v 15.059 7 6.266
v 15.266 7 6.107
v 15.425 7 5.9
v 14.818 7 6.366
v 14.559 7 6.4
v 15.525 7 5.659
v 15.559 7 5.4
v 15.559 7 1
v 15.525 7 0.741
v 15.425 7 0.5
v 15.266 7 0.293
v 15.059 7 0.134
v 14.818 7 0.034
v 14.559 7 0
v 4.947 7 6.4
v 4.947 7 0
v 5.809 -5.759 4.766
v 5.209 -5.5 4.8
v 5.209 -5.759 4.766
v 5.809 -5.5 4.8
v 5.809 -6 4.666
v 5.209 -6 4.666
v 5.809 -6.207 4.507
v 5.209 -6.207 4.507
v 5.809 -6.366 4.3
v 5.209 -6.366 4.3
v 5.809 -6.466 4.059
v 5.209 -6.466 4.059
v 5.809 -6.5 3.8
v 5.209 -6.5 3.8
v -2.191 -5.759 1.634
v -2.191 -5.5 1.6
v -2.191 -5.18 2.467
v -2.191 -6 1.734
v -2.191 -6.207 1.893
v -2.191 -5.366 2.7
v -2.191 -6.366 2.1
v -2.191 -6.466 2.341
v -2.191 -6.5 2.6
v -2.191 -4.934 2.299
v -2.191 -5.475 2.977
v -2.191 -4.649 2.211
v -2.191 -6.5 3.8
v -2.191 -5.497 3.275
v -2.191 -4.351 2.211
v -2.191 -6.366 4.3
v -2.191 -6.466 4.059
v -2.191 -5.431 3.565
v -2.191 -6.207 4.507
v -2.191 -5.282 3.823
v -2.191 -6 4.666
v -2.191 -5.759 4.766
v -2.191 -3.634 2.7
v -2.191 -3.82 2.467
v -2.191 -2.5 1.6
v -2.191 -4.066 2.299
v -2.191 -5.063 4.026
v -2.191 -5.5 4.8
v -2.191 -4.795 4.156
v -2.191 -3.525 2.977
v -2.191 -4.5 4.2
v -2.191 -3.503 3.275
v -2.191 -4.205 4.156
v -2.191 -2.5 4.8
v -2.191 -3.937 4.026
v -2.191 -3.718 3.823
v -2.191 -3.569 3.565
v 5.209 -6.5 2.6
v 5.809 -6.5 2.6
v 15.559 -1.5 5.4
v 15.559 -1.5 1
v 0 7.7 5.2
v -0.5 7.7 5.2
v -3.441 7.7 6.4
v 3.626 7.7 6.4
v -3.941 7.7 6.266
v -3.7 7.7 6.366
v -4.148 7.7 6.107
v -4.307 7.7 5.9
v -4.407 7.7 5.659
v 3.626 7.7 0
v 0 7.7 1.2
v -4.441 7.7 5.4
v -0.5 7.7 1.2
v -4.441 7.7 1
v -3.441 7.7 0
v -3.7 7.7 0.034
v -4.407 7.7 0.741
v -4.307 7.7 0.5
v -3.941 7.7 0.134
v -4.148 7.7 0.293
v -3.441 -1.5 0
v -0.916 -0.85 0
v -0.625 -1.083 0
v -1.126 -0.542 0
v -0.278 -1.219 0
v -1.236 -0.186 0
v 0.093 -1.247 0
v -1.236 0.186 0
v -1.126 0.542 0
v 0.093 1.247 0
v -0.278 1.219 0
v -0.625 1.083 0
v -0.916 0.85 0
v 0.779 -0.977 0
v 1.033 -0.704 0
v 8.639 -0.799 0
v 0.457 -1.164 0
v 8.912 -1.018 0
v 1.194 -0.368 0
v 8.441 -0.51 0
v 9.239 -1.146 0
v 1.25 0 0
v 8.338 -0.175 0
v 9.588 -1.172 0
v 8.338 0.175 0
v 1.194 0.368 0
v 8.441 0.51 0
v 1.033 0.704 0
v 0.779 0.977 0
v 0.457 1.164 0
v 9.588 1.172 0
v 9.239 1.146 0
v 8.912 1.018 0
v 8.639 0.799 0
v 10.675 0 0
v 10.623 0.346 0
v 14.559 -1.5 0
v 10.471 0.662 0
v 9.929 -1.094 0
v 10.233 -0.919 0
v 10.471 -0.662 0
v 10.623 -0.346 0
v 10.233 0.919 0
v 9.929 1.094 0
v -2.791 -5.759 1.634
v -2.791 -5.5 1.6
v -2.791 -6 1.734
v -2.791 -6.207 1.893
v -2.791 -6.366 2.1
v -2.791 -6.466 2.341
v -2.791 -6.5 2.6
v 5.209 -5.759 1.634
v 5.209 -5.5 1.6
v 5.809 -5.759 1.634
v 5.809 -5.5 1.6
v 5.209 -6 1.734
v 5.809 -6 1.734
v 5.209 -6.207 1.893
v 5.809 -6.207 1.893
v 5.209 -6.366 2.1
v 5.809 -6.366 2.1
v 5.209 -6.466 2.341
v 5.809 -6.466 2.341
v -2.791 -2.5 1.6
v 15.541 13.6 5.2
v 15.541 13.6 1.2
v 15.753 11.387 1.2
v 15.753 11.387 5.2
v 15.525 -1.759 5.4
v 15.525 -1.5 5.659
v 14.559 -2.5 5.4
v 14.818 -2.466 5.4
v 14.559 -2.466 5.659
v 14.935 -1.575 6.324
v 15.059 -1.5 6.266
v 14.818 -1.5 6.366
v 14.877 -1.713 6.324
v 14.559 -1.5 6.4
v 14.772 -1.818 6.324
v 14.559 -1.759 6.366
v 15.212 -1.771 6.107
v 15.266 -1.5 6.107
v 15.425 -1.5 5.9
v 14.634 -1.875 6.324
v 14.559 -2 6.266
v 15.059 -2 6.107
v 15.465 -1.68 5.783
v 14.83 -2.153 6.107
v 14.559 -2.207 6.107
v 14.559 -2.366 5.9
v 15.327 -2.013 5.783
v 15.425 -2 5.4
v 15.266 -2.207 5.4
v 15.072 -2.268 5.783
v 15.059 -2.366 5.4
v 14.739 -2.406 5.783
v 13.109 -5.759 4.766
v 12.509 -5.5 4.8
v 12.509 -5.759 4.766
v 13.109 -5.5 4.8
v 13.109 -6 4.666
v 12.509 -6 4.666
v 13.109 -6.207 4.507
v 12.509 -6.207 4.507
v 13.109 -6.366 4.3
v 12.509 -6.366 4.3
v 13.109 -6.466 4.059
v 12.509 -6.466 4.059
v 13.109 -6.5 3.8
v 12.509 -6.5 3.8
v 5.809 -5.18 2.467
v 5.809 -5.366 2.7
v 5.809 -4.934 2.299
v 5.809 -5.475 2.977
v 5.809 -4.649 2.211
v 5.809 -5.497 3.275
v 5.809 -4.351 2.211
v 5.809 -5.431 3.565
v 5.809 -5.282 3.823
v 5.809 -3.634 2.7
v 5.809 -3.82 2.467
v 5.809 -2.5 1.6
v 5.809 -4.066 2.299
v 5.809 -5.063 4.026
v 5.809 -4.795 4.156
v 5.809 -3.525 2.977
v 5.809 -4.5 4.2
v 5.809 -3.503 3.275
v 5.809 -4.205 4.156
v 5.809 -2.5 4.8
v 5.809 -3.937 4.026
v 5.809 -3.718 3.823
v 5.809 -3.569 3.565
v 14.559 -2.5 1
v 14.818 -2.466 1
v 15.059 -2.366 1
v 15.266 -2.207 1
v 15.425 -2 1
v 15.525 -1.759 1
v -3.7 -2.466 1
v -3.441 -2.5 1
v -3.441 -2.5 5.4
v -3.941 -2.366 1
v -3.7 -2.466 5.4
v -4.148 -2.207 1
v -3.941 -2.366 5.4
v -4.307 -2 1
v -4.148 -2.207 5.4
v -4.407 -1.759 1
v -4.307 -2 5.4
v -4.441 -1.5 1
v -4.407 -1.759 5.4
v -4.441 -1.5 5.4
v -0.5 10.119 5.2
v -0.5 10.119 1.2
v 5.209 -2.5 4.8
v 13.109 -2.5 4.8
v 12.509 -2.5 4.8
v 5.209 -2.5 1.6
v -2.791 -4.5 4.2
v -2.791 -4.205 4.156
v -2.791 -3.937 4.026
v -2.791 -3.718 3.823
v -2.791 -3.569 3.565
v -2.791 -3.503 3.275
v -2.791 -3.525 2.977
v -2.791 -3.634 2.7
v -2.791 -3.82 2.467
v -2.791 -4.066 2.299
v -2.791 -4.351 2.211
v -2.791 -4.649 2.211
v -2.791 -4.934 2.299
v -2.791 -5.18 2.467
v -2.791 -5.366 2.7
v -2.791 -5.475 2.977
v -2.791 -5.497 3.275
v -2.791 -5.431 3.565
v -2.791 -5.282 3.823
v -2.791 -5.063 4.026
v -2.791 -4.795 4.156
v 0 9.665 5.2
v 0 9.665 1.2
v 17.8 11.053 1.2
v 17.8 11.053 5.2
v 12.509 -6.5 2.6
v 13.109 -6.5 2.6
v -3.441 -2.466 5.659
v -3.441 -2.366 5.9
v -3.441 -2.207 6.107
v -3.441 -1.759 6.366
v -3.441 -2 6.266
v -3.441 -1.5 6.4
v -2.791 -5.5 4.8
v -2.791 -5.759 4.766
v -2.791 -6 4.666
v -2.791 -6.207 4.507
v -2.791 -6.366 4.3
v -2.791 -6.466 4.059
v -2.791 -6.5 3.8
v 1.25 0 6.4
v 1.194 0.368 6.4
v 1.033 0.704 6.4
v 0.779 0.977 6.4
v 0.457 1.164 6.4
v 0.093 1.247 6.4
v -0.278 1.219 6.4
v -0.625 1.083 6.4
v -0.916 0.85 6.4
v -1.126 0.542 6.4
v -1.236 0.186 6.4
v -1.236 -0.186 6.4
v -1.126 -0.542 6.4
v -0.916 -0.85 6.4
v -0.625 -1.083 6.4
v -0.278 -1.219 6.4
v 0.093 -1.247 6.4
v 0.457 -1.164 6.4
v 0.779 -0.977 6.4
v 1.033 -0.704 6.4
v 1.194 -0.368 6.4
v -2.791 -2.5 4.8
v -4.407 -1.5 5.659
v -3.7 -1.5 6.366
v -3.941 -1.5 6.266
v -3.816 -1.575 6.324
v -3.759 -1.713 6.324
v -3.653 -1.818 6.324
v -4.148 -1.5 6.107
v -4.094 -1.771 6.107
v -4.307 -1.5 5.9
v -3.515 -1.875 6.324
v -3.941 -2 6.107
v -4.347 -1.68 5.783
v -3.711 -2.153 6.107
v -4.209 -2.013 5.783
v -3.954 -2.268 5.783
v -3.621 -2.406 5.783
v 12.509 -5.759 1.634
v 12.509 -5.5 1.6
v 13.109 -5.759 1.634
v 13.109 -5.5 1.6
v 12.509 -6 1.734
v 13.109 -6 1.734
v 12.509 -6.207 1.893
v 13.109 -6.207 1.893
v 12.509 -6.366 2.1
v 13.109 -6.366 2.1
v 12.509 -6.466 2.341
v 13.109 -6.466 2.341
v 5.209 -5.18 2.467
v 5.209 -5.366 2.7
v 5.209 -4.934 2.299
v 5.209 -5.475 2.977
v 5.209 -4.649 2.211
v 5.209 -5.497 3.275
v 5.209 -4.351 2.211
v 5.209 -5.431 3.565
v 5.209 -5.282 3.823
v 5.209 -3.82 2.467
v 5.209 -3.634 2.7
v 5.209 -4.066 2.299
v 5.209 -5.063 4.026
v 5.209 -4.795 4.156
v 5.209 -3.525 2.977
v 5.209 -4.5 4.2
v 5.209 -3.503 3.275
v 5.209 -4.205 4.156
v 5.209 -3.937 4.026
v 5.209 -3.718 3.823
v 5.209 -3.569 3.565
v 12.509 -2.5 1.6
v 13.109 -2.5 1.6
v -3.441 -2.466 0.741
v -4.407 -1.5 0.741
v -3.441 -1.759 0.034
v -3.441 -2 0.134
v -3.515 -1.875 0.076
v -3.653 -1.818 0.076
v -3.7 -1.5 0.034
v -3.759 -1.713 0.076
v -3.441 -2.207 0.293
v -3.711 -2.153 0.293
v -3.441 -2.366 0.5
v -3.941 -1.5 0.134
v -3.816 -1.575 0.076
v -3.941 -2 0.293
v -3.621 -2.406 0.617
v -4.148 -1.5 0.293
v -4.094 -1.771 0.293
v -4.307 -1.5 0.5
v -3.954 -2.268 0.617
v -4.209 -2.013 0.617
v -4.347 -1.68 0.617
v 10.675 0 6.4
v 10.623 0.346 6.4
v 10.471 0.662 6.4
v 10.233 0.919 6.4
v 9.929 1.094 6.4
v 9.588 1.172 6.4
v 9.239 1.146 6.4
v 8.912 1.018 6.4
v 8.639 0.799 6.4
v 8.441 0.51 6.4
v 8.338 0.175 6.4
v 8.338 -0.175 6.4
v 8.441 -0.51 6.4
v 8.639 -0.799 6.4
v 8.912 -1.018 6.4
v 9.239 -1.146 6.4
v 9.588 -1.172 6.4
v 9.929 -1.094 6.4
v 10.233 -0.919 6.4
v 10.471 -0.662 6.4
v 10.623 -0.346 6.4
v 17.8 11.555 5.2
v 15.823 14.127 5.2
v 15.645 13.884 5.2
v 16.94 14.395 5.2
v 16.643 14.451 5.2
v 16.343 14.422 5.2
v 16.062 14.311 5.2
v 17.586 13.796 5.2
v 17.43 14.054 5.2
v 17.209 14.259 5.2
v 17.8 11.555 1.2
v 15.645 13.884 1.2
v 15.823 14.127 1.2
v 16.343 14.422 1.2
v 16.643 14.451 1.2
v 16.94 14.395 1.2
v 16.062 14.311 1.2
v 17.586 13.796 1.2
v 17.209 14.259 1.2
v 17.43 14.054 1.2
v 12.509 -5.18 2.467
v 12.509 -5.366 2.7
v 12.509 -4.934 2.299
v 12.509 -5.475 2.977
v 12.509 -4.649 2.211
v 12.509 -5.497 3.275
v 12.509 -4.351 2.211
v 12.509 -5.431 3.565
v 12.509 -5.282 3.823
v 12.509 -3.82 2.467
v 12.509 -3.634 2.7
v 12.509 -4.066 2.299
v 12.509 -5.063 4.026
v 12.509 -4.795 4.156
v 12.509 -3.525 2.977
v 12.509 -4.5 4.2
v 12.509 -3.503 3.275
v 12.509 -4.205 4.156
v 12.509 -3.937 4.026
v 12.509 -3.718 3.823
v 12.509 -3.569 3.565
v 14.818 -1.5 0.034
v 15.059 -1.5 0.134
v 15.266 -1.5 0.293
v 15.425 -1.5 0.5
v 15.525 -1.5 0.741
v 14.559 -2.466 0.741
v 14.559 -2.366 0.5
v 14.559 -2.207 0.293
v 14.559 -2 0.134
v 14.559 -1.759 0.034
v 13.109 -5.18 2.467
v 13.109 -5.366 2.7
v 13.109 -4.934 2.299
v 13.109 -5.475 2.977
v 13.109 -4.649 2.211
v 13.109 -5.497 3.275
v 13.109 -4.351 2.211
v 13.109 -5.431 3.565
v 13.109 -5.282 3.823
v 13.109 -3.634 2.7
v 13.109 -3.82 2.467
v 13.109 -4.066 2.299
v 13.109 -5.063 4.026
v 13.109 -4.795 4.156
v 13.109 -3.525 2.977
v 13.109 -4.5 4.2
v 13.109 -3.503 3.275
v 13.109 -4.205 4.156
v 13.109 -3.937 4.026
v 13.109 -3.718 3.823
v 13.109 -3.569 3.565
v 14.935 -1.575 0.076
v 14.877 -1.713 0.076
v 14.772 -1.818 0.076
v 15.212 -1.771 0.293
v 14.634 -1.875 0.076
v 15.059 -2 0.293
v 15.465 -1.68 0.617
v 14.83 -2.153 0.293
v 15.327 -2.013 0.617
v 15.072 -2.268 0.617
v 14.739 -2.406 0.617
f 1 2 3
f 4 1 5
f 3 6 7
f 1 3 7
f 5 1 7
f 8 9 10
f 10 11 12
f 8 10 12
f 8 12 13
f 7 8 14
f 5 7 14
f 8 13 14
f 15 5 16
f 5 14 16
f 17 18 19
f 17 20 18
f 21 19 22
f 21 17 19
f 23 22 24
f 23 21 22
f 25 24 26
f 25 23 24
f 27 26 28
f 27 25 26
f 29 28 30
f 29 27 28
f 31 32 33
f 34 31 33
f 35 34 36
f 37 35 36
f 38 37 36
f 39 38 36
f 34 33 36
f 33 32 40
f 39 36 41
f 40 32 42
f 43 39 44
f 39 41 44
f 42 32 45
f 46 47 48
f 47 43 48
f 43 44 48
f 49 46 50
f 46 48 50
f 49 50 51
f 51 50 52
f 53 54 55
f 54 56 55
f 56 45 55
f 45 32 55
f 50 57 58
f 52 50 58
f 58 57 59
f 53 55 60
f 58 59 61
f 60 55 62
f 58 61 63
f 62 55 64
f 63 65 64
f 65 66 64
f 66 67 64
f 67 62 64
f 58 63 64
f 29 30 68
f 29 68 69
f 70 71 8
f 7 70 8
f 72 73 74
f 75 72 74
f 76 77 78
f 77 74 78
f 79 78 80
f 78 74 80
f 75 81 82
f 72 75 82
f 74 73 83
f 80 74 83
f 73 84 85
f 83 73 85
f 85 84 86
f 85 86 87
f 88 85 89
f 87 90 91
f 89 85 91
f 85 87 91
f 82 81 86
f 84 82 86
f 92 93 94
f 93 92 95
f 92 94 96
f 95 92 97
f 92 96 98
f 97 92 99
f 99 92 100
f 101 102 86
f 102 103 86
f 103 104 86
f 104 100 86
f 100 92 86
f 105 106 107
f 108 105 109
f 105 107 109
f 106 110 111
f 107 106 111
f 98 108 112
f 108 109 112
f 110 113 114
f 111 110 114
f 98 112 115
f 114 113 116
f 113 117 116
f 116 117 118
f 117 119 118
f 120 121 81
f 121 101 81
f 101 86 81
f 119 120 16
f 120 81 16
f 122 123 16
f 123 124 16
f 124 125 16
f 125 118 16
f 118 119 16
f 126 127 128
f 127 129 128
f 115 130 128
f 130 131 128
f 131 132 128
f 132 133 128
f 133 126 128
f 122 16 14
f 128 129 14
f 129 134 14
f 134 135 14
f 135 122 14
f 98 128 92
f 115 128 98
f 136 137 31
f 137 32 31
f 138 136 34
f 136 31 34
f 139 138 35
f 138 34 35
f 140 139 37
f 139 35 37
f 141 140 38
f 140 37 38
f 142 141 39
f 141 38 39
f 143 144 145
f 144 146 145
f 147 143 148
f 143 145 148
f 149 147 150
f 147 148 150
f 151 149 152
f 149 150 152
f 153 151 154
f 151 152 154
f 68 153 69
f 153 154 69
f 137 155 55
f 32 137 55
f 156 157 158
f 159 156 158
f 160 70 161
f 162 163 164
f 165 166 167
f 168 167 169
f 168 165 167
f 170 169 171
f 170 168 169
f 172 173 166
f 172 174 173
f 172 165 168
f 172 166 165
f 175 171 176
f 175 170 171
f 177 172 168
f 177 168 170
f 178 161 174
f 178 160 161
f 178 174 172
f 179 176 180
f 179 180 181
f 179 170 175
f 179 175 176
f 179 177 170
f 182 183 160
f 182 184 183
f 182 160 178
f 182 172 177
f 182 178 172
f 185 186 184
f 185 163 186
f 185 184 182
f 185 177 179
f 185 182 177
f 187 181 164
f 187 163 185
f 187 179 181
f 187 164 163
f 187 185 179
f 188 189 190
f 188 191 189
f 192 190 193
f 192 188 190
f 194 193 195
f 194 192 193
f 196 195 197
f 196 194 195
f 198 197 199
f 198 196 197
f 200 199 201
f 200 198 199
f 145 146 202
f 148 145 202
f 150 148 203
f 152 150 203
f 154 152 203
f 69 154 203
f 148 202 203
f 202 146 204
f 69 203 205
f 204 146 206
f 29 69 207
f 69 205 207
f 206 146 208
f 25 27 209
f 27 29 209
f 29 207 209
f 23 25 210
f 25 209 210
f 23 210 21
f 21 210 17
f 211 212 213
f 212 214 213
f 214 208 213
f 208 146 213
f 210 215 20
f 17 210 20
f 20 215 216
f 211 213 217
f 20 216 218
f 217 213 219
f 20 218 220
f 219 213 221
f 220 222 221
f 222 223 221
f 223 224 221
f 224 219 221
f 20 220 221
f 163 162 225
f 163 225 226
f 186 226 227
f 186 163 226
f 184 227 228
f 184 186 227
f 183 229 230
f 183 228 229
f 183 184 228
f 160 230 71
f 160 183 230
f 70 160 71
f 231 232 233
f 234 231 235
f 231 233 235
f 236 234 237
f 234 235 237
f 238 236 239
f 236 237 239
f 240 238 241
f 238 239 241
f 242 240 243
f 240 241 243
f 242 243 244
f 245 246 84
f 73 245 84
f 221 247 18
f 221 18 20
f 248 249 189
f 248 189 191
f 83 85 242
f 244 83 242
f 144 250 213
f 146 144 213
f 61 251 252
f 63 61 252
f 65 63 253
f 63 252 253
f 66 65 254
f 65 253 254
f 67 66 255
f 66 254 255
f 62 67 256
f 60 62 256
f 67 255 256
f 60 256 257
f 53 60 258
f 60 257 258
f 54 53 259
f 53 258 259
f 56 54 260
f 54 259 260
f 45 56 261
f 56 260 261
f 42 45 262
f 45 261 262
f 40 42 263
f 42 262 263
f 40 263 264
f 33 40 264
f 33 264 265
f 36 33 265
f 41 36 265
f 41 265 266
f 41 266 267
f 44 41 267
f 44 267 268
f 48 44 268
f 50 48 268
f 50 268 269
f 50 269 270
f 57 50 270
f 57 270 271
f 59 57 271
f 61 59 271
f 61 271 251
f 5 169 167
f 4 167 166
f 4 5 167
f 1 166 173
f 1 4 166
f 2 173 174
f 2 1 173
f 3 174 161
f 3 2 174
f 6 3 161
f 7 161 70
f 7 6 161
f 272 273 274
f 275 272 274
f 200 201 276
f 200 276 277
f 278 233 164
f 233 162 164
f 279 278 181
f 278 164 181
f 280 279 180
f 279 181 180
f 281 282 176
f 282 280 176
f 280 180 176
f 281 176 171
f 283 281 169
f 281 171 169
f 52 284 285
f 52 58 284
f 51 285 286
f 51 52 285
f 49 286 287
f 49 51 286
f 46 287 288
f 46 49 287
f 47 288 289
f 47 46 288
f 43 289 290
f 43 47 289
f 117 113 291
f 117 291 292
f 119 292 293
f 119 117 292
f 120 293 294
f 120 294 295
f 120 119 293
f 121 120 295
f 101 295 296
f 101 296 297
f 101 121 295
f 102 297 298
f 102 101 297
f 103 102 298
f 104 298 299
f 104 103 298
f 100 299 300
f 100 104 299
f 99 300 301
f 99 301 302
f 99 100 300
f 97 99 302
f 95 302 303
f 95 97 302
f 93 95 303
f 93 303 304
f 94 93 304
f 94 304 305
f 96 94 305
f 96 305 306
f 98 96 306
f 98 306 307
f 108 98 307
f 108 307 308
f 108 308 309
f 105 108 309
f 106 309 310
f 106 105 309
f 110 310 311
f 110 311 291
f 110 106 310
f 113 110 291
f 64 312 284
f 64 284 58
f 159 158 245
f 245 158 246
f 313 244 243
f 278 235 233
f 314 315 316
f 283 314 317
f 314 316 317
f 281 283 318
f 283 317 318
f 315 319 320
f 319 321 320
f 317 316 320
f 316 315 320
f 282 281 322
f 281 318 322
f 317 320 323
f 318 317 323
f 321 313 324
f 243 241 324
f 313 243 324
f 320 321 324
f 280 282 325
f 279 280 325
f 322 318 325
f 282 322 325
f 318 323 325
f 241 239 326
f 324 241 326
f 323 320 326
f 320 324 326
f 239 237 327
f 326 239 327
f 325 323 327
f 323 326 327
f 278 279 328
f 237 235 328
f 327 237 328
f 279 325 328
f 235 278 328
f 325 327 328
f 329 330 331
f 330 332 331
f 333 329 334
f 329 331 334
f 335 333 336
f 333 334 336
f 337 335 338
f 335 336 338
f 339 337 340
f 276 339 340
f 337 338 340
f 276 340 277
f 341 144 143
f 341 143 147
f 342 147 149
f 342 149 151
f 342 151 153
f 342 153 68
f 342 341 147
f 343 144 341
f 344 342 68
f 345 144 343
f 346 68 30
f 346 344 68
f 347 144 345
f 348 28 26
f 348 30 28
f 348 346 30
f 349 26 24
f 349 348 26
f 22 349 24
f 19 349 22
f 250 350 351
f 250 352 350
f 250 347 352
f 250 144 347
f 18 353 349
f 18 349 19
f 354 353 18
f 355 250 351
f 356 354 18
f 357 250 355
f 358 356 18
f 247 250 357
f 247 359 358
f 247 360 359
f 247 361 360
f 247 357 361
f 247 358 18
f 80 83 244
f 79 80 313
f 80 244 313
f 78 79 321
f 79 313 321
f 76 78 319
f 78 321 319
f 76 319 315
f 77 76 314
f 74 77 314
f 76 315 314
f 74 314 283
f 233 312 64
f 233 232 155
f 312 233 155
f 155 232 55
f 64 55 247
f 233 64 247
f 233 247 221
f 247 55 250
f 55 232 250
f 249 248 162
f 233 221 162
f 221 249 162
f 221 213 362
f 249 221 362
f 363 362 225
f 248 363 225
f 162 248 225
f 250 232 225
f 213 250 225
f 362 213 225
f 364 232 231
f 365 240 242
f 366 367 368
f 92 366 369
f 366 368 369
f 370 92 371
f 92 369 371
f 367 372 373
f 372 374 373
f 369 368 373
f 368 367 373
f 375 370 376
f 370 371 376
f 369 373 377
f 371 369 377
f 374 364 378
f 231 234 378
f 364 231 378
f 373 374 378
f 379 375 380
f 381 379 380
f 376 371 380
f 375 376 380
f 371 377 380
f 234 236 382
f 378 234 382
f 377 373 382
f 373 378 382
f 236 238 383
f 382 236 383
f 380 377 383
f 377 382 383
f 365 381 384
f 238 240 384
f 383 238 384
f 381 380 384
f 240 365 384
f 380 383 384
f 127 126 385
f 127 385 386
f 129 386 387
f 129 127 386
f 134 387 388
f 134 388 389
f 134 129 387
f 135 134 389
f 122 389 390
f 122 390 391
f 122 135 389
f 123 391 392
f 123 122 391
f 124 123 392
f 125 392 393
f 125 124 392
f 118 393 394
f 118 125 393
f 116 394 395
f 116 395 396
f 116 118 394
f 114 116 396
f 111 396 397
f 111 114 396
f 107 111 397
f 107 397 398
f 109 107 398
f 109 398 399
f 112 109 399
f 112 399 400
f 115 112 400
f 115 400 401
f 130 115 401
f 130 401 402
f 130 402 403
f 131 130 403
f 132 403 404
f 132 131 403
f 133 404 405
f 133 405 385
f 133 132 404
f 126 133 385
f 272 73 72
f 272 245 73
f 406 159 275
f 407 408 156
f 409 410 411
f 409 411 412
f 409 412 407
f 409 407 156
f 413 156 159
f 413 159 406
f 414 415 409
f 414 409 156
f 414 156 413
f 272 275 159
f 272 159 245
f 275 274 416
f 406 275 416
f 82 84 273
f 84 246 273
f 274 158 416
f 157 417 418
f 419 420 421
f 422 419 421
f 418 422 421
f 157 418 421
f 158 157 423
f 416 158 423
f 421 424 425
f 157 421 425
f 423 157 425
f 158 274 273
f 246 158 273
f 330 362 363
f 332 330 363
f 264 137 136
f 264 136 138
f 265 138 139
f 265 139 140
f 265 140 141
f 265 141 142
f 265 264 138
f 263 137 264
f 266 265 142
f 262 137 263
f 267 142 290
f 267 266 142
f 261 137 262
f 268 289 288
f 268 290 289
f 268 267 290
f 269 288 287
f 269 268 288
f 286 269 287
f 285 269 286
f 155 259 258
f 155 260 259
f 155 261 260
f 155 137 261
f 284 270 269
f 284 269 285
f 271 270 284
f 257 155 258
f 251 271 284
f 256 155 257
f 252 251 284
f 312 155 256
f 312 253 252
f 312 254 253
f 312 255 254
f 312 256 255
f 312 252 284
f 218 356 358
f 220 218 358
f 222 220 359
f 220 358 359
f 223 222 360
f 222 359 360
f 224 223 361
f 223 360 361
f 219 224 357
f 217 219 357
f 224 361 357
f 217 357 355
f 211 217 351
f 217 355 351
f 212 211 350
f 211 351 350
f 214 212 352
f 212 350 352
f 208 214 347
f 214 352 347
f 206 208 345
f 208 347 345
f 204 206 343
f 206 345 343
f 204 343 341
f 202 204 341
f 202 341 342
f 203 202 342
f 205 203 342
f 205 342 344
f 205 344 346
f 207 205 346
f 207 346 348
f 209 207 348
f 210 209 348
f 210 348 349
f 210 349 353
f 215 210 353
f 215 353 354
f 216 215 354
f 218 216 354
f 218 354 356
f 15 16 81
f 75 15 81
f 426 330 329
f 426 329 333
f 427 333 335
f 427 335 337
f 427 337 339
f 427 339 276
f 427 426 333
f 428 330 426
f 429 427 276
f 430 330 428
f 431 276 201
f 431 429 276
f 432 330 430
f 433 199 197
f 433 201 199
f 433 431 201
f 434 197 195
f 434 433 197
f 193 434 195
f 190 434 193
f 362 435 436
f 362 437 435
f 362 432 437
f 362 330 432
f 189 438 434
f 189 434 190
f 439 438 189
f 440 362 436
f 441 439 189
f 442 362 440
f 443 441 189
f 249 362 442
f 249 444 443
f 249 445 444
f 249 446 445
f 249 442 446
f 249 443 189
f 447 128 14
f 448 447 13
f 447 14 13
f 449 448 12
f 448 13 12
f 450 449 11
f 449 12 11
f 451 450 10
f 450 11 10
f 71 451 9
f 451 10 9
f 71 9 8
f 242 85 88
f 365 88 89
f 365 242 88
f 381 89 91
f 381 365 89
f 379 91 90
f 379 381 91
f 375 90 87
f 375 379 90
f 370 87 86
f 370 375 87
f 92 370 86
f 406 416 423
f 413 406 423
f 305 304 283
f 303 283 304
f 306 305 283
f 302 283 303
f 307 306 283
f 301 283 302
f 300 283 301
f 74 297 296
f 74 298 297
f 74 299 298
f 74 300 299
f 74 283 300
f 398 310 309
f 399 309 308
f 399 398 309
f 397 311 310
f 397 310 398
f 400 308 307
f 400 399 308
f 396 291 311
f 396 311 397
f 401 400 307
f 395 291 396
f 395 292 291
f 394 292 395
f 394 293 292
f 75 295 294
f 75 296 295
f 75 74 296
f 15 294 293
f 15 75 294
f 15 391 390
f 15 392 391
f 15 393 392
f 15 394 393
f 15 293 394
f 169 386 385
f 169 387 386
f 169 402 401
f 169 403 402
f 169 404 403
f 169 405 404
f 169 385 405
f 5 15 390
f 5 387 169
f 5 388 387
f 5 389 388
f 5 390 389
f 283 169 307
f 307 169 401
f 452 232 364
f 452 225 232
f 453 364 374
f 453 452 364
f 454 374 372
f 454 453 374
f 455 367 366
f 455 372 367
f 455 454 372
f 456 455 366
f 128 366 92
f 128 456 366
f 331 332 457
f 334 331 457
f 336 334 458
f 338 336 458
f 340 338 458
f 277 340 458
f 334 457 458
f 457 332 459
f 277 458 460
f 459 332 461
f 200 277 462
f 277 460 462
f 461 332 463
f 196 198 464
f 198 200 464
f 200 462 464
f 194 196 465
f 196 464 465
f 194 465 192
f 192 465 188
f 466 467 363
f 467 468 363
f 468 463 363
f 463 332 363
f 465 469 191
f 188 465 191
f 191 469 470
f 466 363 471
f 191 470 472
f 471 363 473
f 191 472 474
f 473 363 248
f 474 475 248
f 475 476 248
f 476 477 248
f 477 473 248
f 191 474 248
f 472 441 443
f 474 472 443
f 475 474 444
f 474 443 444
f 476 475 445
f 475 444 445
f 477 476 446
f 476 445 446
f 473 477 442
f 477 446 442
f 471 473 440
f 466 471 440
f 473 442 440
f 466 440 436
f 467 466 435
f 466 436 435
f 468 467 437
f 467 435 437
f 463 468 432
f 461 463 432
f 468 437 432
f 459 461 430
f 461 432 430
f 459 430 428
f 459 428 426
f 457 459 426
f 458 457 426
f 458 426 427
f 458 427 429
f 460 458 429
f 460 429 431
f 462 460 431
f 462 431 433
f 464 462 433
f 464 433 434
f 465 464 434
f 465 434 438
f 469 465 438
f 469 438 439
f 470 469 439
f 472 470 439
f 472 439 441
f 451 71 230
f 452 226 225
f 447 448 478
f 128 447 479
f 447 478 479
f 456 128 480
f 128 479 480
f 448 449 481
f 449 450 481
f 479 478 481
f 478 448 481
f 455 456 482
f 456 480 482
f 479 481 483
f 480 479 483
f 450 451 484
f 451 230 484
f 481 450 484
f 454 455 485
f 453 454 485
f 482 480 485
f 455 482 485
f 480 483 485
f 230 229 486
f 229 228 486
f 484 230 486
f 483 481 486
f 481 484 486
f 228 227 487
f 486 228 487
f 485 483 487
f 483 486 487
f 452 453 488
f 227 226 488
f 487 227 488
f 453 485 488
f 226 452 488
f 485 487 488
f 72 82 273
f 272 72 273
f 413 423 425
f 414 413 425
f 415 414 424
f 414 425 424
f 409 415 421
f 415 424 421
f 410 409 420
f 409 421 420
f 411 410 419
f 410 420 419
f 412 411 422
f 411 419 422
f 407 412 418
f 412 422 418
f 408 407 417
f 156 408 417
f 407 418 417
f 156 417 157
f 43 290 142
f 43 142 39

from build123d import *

# Parameters (mm, degrees)
SKETCH_1_R           = 1.25
SKETCH_1_R_2         = 1.175
EXTRUDE_1_DEPTH      = 6.4
SKETCH_3_W           = 0.6
SKETCH_3_H           = 3.2
EXTRUDE_2_DEPTH      = 4
SKETCH_4_R           = 1
CUT_EXTRUDE_1_DEPTH  = 20
FILLET_1_R           = 1
FILLET_2_R           = 1
EXTRUDE_3_DEPTH      = 2
EXTRUDE_3_DEPTH_BACK = 2


with BuildPart() as part:
    # 草图1 → 凸台-拉伸1 (new body)
    with BuildSketch(Plane.XY):
        Polygon((-4.440828402, -2.5), (15.559171598, -2.5), (15.559171598, 7), (4.946745562, 7), (3.625739645, 7.7), (-4.440828402, 7.7), align=None)
        Circle(SKETCH_1_R, mode=Mode.SUBTRACT)
        with Locations((9.5, 0)):
            Circle(SKETCH_1_R_2, mode=Mode.SUBTRACT)
    extrude(amount=EXTRUDE_1_DEPTH)

    # 草图3 → 凸台-拉伸2 (add)
    with BuildSketch(Plane.XZ.offset(2.5)):
        with Locations((12.809171598, 3.2)):
            Rectangle(SKETCH_3_W, SKETCH_3_H)
        with Locations((-2.490828402, 3.2)):
            Rectangle(SKETCH_3_W, SKETCH_3_H)
        with Locations((5.509171598, 3.2)):
            Rectangle(SKETCH_3_W, SKETCH_3_H)
    extrude(amount=EXTRUDE_2_DEPTH)

    # 草图4 → 切除-拉伸1 (cut)
    with BuildSketch(Plane.ZY.offset(2.790828402)):
        with Locations((3.2, -4.5)):
            Circle(SKETCH_4_R)
    extrude(amount=-CUT_EXTRUDE_1_DEPTH, mode=Mode.SUBTRACT)

    # 圆角1
    fillet_1_edges = [part.edges().sort_by_distance(p)[0] for p in [
        (-2.490828402, -6.5, 1.6),
        (-2.490828402, -6.5, 4.8),
        (5.509171598, -6.5, 1.6),
        (5.509171598, -6.5, 4.8),
        (12.809171598, -6.5, 1.6),
        (12.809171598, -6.5, 4.8),
    ]]
    fillet(fillet_1_edges, radius=FILLET_1_R)

    # 圆角2
    fillet_2_edges = [part.edges().sort_by_distance(p)[0] for p in [
        (15.559171598, -2.5, 3.2),
        (-4.440828402, -2.5, 3.2),
        (15.559171598, 2.25, 6.4),
        (-4.440828402, 2.6, 6.4),
        (15.559171598, 2.25, 0),
        (5.559171598, -2.5, 0),
        (-4.440828402, 2.6, 0),
        (5.559171598, -2.5, 6.4),
    ]]
    fillet(fillet_2_edges, radius=FILLET_2_R)

    # 草图5 → 凸台-拉伸3 (add, two sides: drawn at the far end of the back side and taken through both)
    with BuildSketch(Plane.XY.offset(3.2).offset(-EXTRUDE_3_DEPTH_BACK)):
        with BuildLine():
            Line((0, 6.283577636), (0, 9.664597829))
            Line((0, 9.664597829), (17.8, 11.053189231))
            Line((17.8, 11.053189231), (17.8, 11.555466087))
            Line((17.8, 11.555466087), (17.585961229, 13.795738554))
            ThreePointArc((17.585961229, 13.795738554), (16.491955313, 14.447080857), (15.54107575, 13.60036733))
            Line((15.54107575, 13.60036733), (15.75254613, 11.386977345))
            Line((15.75254613, 11.386977345), (-0.5, 10.119103985))
            Line((-0.5, 10.119103985), (-0.5, 6.283577636))
            Line((-0.5, 6.283577636), (0, 6.283577636))
        make_face()
    extrude(amount=EXTRUDE_3_DEPTH + EXTRUDE_3_DEPTH_BACK)


solid = part.part
